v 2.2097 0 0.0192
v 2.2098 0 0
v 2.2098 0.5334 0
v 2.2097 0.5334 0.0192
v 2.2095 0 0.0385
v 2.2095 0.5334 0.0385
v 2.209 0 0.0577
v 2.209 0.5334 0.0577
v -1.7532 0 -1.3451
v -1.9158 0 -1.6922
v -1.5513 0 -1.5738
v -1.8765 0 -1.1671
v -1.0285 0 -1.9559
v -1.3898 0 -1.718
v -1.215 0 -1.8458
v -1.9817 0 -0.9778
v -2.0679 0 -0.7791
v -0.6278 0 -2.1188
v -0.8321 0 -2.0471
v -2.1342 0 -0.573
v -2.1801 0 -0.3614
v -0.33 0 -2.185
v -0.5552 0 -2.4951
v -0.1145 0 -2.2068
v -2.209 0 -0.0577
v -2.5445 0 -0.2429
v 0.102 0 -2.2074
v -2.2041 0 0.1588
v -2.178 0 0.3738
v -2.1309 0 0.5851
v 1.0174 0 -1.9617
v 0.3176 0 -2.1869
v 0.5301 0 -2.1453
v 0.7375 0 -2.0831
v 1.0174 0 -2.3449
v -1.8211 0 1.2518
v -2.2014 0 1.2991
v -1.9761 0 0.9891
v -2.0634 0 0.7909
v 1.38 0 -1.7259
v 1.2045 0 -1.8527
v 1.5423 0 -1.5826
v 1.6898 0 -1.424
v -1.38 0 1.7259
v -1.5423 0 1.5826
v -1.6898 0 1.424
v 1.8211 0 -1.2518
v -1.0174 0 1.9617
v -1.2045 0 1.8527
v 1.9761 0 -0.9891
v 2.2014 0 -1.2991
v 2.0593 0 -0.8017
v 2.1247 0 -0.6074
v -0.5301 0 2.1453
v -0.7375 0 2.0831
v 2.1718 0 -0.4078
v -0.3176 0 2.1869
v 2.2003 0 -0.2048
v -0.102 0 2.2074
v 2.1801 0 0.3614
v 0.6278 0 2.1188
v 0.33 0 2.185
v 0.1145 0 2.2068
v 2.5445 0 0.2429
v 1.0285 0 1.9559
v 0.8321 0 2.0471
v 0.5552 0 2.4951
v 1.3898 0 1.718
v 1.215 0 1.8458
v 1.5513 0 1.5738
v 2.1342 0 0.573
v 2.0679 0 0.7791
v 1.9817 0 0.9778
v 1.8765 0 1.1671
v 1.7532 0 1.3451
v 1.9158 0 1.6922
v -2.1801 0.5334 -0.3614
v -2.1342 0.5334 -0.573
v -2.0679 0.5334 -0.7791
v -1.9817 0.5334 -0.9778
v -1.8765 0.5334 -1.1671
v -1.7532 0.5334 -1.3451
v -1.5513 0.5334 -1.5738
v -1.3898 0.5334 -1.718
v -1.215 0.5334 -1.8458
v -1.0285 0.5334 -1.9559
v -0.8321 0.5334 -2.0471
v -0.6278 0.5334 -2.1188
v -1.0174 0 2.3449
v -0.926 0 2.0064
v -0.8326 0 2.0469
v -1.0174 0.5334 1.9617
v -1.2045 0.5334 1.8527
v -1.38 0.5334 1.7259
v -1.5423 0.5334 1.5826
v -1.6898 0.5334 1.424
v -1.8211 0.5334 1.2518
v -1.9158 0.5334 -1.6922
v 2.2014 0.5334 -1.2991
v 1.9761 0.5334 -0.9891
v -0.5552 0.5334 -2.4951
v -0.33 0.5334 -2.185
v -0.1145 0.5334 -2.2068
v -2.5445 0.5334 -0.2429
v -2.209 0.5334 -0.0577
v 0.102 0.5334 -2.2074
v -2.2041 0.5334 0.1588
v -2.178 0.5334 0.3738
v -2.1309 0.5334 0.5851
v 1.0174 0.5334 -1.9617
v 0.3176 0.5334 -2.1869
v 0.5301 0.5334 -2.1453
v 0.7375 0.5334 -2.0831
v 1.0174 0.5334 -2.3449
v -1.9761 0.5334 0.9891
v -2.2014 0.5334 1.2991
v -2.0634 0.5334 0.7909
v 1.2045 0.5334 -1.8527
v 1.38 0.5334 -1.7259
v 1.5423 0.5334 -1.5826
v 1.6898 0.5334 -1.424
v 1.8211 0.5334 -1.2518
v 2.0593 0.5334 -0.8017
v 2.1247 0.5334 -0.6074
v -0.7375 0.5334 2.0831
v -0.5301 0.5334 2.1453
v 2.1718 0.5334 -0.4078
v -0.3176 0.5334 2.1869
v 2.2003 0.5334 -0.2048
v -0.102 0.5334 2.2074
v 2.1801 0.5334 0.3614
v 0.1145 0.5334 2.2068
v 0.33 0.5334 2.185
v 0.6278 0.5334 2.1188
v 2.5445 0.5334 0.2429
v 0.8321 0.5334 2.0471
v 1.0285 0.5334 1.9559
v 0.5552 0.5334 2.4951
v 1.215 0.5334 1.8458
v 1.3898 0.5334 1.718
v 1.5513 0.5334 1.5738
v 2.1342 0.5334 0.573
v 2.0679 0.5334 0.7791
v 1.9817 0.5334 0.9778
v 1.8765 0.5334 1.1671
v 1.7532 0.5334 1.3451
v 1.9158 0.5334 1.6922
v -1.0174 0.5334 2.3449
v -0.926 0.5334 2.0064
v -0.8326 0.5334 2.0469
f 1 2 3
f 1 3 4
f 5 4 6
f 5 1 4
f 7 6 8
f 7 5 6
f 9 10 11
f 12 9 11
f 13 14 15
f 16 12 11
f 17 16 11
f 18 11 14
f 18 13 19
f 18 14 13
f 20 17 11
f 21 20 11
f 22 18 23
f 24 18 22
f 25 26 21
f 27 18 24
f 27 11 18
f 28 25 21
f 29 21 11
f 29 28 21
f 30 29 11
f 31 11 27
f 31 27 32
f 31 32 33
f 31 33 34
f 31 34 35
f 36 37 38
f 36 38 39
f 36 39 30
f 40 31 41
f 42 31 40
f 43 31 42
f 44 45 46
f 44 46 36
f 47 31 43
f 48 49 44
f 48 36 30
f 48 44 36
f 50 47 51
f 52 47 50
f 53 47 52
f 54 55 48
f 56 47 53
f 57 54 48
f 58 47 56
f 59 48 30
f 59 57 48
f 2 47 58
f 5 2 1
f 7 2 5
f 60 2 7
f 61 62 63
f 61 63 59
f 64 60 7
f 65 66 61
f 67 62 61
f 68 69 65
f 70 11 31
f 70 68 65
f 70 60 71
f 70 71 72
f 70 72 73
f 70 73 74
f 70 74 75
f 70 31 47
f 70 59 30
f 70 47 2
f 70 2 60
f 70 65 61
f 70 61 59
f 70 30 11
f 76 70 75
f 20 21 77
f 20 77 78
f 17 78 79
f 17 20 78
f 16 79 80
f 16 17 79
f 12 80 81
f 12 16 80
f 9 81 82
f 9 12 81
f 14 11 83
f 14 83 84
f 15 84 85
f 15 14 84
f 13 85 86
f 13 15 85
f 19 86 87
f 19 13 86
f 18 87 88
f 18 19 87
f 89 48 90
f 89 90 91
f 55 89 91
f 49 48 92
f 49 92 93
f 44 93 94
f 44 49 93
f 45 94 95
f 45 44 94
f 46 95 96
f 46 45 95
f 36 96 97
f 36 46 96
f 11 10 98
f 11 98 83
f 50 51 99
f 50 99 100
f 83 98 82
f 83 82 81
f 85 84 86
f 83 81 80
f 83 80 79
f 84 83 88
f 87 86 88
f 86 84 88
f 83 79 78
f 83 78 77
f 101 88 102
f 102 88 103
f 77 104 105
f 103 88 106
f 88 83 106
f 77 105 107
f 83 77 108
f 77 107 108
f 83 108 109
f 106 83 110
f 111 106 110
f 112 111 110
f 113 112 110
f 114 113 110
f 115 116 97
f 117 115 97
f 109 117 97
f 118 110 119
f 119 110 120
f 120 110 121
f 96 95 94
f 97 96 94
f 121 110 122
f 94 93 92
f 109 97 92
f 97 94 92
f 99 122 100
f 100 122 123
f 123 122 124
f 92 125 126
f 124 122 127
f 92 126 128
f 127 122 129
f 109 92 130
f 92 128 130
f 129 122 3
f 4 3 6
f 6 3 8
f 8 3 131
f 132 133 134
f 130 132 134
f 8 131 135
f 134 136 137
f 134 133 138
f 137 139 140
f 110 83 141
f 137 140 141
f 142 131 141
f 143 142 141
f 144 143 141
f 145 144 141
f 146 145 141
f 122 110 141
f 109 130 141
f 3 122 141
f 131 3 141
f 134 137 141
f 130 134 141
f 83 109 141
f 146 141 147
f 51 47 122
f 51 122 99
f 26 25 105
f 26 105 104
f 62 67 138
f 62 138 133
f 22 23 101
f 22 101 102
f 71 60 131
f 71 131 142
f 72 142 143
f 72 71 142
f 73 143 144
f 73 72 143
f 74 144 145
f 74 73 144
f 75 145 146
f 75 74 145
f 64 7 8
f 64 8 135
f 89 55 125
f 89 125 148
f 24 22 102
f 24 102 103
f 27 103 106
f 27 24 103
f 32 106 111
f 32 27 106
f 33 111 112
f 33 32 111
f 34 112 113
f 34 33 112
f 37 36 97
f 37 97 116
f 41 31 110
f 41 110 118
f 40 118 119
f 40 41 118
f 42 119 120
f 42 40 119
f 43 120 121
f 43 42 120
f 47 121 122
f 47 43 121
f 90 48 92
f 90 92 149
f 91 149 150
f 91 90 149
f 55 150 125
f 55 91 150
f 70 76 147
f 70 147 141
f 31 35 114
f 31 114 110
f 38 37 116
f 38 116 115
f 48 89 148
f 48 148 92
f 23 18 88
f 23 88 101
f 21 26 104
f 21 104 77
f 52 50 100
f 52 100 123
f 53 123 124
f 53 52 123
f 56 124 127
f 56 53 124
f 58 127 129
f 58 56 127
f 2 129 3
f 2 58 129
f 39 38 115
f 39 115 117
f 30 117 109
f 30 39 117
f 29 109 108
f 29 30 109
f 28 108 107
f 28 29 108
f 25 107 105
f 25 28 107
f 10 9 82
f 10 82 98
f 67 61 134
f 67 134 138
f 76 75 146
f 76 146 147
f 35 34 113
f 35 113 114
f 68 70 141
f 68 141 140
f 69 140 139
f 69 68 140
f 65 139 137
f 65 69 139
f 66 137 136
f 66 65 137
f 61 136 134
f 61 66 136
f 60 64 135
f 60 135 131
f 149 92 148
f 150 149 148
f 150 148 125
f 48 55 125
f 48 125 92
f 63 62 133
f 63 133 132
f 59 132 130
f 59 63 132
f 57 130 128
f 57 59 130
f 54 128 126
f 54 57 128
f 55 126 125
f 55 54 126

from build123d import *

# Parameters (mm, degrees)
F1_DEPTH = 0.5334


with BuildPart() as f1:
    # F0 (on Front) → F1 (new body)
    with BuildSketch(Plane.XZ):
        with BuildLine():
            ThreePointArc((1.976106, -0.989051), (2.150583, -0.508143), (2.2098, 0))
            ThreePointArc((2.2098, 0), (2.209612, 0.028848), (2.209047, 0.057692))
            ThreePointArc((2.209047, 0.057692), (2.199796, 0.21003), (2.180053, 0.361366))
            ThreePointArc((2.180053, 0.361366), (2.027228, 0.879525), (1.753246, 1.345119))
            ThreePointArc((1.753246, 1.345119), (1.65622, 1.462926), (1.551294, 1.573754))
            ThreePointArc((1.551294, 1.573754), (1.12309, 1.903125), (0.627765, 2.118756))
            ThreePointArc((0.627765, 2.118756), (0.480024, 2.157033), (0.329994, 2.185022))
            ThreePointArc((0.329994, 2.185022), (-0.21003, 2.199796), (-0.737501, 2.083101))
            Line((-0.737501, 2.083101), (-1.017353, 1.961685))
            ThreePointArc((-1.017353, 1.961685), (-1.462926, 1.65622), (-1.821067, 1.251771))
            ThreePointArc((-1.821067, 1.251771), (-1.903125, 1.12309), (-1.976106, 0.989051))
            ThreePointArc((-1.976106, 0.989051), (-2.157033, 0.480024), (-2.209047, -0.057692))
            ThreePointArc((-2.209047, -0.057692), (-2.199796, -0.21003), (-2.180053, -0.361366))
            ThreePointArc((-2.180053, -0.361366), (-2.027228, -0.879525), (-1.753246, -1.345119))
            ThreePointArc((-1.753246, -1.345119), (-1.65622, -1.462926), (-1.551294, -1.573754))
            ThreePointArc((-1.551294, -1.573754), (-1.12309, -1.903125), (-0.627765, -2.118756))
            ThreePointArc((-0.627765, -2.118756), (-0.480024, -2.157033), (-0.329994, -2.185022))
            ThreePointArc((-0.329994, -2.185022), (0.21003, -2.199796), (0.737501, -2.083101))
            ThreePointArc((0.737501, -2.083101), (0.879525, -2.027228), (1.017353, -1.961685))
            ThreePointArc((1.017353, -1.961685), (1.462926, -1.65622), (1.821067, -1.251771))
            ThreePointArc((1.821067, -1.251771), (1.903125, -1.12309), (1.976106, -0.989051))
        make_face()
        with BuildLine():
            ThreePointArc((0.329994, 2.185022), (0.480024, 2.157033), (0.627765, 2.118756))
            Line((0.627765, 2.118756), (0.555247, 2.495057))
            Line((0.555247, 2.495057), (0.329994, 2.185022))
        make_face()
        with BuildLine():
            ThreePointArc((1.551294, 1.573754), (1.65622, 1.462926), (1.753246, 1.345119))
            Line((1.753246, 1.345119), (1.915762, 1.692177))
            Line((1.915762, 1.692177), (1.551294, 1.573754))
        make_face()
        with BuildLine():
            ThreePointArc((2.180053, 0.361366), (2.199796, 0.21003), (2.209047, 0.057692))
            Line((2.209047, 0.057692), (2.544521, 0.242943))
            Line((2.544521, 0.242943), (2.180053, 0.361366))
        make_face()
        with BuildLine():
            Line((2.201359, -1.299087), (1.976106, -0.989051))
            ThreePointArc((1.976106, -0.989051), (1.903125, -1.12309), (1.821067, -1.251771))
            Line((1.821067, -1.251771), (2.201359, -1.299087))
        make_face()
        with BuildLine():
            Line((1.017353, -2.34491), (1.017353, -1.961685))
            ThreePointArc((1.017353, -1.961685), (0.879525, -2.027228), (0.737501, -2.083101))
            Line((0.737501, -2.083101), (1.017353, -2.34491))
        make_face()
        with BuildLine():
            Line((-0.555247, -2.495057), (-0.329994, -2.185022))
            ThreePointArc((-0.329994, -2.185022), (-0.480024, -2.157033), (-0.627765, -2.118756))
            Line((-0.627765, -2.118756), (-0.555247, -2.495057))
        make_face()
        with BuildLine():
            Line((-1.915762, -1.692177), (-1.551294, -1.573754))
            ThreePointArc((-1.551294, -1.573754), (-1.65622, -1.462926), (-1.753246, -1.345119))
            Line((-1.753246, -1.345119), (-1.915762, -1.692177))
        make_face()
        with BuildLine():
            Line((-2.544521, -0.242943), (-2.180053, -0.361366))
            ThreePointArc((-2.180053, -0.361366), (-2.199796, -0.21003), (-2.209047, -0.057692))
            Line((-2.209047, -0.057692), (-2.544521, -0.242943))
        make_face()
        with BuildLine():
            ThreePointArc((-1.976106, 0.989051), (-1.903125, 1.12309), (-1.821067, 1.251771))
            Line((-1.821067, 1.251771), (-2.201359, 1.299087))
            Line((-2.201359, 1.299087), (-1.976106, 0.989051))
        make_face()
        with BuildLine():
            ThreePointArc((-1.017353, 1.961685), (-0.879525, 2.027228), (-0.737501, 2.083101))
            Line((-0.737501, 2.083101), (-1.017353, 2.34491))
            Line((-1.017353, 2.34491), (-1.017353, 1.961685))
        make_face()
    extrude(amount=-F1_DEPTH)


solid = f1.part
